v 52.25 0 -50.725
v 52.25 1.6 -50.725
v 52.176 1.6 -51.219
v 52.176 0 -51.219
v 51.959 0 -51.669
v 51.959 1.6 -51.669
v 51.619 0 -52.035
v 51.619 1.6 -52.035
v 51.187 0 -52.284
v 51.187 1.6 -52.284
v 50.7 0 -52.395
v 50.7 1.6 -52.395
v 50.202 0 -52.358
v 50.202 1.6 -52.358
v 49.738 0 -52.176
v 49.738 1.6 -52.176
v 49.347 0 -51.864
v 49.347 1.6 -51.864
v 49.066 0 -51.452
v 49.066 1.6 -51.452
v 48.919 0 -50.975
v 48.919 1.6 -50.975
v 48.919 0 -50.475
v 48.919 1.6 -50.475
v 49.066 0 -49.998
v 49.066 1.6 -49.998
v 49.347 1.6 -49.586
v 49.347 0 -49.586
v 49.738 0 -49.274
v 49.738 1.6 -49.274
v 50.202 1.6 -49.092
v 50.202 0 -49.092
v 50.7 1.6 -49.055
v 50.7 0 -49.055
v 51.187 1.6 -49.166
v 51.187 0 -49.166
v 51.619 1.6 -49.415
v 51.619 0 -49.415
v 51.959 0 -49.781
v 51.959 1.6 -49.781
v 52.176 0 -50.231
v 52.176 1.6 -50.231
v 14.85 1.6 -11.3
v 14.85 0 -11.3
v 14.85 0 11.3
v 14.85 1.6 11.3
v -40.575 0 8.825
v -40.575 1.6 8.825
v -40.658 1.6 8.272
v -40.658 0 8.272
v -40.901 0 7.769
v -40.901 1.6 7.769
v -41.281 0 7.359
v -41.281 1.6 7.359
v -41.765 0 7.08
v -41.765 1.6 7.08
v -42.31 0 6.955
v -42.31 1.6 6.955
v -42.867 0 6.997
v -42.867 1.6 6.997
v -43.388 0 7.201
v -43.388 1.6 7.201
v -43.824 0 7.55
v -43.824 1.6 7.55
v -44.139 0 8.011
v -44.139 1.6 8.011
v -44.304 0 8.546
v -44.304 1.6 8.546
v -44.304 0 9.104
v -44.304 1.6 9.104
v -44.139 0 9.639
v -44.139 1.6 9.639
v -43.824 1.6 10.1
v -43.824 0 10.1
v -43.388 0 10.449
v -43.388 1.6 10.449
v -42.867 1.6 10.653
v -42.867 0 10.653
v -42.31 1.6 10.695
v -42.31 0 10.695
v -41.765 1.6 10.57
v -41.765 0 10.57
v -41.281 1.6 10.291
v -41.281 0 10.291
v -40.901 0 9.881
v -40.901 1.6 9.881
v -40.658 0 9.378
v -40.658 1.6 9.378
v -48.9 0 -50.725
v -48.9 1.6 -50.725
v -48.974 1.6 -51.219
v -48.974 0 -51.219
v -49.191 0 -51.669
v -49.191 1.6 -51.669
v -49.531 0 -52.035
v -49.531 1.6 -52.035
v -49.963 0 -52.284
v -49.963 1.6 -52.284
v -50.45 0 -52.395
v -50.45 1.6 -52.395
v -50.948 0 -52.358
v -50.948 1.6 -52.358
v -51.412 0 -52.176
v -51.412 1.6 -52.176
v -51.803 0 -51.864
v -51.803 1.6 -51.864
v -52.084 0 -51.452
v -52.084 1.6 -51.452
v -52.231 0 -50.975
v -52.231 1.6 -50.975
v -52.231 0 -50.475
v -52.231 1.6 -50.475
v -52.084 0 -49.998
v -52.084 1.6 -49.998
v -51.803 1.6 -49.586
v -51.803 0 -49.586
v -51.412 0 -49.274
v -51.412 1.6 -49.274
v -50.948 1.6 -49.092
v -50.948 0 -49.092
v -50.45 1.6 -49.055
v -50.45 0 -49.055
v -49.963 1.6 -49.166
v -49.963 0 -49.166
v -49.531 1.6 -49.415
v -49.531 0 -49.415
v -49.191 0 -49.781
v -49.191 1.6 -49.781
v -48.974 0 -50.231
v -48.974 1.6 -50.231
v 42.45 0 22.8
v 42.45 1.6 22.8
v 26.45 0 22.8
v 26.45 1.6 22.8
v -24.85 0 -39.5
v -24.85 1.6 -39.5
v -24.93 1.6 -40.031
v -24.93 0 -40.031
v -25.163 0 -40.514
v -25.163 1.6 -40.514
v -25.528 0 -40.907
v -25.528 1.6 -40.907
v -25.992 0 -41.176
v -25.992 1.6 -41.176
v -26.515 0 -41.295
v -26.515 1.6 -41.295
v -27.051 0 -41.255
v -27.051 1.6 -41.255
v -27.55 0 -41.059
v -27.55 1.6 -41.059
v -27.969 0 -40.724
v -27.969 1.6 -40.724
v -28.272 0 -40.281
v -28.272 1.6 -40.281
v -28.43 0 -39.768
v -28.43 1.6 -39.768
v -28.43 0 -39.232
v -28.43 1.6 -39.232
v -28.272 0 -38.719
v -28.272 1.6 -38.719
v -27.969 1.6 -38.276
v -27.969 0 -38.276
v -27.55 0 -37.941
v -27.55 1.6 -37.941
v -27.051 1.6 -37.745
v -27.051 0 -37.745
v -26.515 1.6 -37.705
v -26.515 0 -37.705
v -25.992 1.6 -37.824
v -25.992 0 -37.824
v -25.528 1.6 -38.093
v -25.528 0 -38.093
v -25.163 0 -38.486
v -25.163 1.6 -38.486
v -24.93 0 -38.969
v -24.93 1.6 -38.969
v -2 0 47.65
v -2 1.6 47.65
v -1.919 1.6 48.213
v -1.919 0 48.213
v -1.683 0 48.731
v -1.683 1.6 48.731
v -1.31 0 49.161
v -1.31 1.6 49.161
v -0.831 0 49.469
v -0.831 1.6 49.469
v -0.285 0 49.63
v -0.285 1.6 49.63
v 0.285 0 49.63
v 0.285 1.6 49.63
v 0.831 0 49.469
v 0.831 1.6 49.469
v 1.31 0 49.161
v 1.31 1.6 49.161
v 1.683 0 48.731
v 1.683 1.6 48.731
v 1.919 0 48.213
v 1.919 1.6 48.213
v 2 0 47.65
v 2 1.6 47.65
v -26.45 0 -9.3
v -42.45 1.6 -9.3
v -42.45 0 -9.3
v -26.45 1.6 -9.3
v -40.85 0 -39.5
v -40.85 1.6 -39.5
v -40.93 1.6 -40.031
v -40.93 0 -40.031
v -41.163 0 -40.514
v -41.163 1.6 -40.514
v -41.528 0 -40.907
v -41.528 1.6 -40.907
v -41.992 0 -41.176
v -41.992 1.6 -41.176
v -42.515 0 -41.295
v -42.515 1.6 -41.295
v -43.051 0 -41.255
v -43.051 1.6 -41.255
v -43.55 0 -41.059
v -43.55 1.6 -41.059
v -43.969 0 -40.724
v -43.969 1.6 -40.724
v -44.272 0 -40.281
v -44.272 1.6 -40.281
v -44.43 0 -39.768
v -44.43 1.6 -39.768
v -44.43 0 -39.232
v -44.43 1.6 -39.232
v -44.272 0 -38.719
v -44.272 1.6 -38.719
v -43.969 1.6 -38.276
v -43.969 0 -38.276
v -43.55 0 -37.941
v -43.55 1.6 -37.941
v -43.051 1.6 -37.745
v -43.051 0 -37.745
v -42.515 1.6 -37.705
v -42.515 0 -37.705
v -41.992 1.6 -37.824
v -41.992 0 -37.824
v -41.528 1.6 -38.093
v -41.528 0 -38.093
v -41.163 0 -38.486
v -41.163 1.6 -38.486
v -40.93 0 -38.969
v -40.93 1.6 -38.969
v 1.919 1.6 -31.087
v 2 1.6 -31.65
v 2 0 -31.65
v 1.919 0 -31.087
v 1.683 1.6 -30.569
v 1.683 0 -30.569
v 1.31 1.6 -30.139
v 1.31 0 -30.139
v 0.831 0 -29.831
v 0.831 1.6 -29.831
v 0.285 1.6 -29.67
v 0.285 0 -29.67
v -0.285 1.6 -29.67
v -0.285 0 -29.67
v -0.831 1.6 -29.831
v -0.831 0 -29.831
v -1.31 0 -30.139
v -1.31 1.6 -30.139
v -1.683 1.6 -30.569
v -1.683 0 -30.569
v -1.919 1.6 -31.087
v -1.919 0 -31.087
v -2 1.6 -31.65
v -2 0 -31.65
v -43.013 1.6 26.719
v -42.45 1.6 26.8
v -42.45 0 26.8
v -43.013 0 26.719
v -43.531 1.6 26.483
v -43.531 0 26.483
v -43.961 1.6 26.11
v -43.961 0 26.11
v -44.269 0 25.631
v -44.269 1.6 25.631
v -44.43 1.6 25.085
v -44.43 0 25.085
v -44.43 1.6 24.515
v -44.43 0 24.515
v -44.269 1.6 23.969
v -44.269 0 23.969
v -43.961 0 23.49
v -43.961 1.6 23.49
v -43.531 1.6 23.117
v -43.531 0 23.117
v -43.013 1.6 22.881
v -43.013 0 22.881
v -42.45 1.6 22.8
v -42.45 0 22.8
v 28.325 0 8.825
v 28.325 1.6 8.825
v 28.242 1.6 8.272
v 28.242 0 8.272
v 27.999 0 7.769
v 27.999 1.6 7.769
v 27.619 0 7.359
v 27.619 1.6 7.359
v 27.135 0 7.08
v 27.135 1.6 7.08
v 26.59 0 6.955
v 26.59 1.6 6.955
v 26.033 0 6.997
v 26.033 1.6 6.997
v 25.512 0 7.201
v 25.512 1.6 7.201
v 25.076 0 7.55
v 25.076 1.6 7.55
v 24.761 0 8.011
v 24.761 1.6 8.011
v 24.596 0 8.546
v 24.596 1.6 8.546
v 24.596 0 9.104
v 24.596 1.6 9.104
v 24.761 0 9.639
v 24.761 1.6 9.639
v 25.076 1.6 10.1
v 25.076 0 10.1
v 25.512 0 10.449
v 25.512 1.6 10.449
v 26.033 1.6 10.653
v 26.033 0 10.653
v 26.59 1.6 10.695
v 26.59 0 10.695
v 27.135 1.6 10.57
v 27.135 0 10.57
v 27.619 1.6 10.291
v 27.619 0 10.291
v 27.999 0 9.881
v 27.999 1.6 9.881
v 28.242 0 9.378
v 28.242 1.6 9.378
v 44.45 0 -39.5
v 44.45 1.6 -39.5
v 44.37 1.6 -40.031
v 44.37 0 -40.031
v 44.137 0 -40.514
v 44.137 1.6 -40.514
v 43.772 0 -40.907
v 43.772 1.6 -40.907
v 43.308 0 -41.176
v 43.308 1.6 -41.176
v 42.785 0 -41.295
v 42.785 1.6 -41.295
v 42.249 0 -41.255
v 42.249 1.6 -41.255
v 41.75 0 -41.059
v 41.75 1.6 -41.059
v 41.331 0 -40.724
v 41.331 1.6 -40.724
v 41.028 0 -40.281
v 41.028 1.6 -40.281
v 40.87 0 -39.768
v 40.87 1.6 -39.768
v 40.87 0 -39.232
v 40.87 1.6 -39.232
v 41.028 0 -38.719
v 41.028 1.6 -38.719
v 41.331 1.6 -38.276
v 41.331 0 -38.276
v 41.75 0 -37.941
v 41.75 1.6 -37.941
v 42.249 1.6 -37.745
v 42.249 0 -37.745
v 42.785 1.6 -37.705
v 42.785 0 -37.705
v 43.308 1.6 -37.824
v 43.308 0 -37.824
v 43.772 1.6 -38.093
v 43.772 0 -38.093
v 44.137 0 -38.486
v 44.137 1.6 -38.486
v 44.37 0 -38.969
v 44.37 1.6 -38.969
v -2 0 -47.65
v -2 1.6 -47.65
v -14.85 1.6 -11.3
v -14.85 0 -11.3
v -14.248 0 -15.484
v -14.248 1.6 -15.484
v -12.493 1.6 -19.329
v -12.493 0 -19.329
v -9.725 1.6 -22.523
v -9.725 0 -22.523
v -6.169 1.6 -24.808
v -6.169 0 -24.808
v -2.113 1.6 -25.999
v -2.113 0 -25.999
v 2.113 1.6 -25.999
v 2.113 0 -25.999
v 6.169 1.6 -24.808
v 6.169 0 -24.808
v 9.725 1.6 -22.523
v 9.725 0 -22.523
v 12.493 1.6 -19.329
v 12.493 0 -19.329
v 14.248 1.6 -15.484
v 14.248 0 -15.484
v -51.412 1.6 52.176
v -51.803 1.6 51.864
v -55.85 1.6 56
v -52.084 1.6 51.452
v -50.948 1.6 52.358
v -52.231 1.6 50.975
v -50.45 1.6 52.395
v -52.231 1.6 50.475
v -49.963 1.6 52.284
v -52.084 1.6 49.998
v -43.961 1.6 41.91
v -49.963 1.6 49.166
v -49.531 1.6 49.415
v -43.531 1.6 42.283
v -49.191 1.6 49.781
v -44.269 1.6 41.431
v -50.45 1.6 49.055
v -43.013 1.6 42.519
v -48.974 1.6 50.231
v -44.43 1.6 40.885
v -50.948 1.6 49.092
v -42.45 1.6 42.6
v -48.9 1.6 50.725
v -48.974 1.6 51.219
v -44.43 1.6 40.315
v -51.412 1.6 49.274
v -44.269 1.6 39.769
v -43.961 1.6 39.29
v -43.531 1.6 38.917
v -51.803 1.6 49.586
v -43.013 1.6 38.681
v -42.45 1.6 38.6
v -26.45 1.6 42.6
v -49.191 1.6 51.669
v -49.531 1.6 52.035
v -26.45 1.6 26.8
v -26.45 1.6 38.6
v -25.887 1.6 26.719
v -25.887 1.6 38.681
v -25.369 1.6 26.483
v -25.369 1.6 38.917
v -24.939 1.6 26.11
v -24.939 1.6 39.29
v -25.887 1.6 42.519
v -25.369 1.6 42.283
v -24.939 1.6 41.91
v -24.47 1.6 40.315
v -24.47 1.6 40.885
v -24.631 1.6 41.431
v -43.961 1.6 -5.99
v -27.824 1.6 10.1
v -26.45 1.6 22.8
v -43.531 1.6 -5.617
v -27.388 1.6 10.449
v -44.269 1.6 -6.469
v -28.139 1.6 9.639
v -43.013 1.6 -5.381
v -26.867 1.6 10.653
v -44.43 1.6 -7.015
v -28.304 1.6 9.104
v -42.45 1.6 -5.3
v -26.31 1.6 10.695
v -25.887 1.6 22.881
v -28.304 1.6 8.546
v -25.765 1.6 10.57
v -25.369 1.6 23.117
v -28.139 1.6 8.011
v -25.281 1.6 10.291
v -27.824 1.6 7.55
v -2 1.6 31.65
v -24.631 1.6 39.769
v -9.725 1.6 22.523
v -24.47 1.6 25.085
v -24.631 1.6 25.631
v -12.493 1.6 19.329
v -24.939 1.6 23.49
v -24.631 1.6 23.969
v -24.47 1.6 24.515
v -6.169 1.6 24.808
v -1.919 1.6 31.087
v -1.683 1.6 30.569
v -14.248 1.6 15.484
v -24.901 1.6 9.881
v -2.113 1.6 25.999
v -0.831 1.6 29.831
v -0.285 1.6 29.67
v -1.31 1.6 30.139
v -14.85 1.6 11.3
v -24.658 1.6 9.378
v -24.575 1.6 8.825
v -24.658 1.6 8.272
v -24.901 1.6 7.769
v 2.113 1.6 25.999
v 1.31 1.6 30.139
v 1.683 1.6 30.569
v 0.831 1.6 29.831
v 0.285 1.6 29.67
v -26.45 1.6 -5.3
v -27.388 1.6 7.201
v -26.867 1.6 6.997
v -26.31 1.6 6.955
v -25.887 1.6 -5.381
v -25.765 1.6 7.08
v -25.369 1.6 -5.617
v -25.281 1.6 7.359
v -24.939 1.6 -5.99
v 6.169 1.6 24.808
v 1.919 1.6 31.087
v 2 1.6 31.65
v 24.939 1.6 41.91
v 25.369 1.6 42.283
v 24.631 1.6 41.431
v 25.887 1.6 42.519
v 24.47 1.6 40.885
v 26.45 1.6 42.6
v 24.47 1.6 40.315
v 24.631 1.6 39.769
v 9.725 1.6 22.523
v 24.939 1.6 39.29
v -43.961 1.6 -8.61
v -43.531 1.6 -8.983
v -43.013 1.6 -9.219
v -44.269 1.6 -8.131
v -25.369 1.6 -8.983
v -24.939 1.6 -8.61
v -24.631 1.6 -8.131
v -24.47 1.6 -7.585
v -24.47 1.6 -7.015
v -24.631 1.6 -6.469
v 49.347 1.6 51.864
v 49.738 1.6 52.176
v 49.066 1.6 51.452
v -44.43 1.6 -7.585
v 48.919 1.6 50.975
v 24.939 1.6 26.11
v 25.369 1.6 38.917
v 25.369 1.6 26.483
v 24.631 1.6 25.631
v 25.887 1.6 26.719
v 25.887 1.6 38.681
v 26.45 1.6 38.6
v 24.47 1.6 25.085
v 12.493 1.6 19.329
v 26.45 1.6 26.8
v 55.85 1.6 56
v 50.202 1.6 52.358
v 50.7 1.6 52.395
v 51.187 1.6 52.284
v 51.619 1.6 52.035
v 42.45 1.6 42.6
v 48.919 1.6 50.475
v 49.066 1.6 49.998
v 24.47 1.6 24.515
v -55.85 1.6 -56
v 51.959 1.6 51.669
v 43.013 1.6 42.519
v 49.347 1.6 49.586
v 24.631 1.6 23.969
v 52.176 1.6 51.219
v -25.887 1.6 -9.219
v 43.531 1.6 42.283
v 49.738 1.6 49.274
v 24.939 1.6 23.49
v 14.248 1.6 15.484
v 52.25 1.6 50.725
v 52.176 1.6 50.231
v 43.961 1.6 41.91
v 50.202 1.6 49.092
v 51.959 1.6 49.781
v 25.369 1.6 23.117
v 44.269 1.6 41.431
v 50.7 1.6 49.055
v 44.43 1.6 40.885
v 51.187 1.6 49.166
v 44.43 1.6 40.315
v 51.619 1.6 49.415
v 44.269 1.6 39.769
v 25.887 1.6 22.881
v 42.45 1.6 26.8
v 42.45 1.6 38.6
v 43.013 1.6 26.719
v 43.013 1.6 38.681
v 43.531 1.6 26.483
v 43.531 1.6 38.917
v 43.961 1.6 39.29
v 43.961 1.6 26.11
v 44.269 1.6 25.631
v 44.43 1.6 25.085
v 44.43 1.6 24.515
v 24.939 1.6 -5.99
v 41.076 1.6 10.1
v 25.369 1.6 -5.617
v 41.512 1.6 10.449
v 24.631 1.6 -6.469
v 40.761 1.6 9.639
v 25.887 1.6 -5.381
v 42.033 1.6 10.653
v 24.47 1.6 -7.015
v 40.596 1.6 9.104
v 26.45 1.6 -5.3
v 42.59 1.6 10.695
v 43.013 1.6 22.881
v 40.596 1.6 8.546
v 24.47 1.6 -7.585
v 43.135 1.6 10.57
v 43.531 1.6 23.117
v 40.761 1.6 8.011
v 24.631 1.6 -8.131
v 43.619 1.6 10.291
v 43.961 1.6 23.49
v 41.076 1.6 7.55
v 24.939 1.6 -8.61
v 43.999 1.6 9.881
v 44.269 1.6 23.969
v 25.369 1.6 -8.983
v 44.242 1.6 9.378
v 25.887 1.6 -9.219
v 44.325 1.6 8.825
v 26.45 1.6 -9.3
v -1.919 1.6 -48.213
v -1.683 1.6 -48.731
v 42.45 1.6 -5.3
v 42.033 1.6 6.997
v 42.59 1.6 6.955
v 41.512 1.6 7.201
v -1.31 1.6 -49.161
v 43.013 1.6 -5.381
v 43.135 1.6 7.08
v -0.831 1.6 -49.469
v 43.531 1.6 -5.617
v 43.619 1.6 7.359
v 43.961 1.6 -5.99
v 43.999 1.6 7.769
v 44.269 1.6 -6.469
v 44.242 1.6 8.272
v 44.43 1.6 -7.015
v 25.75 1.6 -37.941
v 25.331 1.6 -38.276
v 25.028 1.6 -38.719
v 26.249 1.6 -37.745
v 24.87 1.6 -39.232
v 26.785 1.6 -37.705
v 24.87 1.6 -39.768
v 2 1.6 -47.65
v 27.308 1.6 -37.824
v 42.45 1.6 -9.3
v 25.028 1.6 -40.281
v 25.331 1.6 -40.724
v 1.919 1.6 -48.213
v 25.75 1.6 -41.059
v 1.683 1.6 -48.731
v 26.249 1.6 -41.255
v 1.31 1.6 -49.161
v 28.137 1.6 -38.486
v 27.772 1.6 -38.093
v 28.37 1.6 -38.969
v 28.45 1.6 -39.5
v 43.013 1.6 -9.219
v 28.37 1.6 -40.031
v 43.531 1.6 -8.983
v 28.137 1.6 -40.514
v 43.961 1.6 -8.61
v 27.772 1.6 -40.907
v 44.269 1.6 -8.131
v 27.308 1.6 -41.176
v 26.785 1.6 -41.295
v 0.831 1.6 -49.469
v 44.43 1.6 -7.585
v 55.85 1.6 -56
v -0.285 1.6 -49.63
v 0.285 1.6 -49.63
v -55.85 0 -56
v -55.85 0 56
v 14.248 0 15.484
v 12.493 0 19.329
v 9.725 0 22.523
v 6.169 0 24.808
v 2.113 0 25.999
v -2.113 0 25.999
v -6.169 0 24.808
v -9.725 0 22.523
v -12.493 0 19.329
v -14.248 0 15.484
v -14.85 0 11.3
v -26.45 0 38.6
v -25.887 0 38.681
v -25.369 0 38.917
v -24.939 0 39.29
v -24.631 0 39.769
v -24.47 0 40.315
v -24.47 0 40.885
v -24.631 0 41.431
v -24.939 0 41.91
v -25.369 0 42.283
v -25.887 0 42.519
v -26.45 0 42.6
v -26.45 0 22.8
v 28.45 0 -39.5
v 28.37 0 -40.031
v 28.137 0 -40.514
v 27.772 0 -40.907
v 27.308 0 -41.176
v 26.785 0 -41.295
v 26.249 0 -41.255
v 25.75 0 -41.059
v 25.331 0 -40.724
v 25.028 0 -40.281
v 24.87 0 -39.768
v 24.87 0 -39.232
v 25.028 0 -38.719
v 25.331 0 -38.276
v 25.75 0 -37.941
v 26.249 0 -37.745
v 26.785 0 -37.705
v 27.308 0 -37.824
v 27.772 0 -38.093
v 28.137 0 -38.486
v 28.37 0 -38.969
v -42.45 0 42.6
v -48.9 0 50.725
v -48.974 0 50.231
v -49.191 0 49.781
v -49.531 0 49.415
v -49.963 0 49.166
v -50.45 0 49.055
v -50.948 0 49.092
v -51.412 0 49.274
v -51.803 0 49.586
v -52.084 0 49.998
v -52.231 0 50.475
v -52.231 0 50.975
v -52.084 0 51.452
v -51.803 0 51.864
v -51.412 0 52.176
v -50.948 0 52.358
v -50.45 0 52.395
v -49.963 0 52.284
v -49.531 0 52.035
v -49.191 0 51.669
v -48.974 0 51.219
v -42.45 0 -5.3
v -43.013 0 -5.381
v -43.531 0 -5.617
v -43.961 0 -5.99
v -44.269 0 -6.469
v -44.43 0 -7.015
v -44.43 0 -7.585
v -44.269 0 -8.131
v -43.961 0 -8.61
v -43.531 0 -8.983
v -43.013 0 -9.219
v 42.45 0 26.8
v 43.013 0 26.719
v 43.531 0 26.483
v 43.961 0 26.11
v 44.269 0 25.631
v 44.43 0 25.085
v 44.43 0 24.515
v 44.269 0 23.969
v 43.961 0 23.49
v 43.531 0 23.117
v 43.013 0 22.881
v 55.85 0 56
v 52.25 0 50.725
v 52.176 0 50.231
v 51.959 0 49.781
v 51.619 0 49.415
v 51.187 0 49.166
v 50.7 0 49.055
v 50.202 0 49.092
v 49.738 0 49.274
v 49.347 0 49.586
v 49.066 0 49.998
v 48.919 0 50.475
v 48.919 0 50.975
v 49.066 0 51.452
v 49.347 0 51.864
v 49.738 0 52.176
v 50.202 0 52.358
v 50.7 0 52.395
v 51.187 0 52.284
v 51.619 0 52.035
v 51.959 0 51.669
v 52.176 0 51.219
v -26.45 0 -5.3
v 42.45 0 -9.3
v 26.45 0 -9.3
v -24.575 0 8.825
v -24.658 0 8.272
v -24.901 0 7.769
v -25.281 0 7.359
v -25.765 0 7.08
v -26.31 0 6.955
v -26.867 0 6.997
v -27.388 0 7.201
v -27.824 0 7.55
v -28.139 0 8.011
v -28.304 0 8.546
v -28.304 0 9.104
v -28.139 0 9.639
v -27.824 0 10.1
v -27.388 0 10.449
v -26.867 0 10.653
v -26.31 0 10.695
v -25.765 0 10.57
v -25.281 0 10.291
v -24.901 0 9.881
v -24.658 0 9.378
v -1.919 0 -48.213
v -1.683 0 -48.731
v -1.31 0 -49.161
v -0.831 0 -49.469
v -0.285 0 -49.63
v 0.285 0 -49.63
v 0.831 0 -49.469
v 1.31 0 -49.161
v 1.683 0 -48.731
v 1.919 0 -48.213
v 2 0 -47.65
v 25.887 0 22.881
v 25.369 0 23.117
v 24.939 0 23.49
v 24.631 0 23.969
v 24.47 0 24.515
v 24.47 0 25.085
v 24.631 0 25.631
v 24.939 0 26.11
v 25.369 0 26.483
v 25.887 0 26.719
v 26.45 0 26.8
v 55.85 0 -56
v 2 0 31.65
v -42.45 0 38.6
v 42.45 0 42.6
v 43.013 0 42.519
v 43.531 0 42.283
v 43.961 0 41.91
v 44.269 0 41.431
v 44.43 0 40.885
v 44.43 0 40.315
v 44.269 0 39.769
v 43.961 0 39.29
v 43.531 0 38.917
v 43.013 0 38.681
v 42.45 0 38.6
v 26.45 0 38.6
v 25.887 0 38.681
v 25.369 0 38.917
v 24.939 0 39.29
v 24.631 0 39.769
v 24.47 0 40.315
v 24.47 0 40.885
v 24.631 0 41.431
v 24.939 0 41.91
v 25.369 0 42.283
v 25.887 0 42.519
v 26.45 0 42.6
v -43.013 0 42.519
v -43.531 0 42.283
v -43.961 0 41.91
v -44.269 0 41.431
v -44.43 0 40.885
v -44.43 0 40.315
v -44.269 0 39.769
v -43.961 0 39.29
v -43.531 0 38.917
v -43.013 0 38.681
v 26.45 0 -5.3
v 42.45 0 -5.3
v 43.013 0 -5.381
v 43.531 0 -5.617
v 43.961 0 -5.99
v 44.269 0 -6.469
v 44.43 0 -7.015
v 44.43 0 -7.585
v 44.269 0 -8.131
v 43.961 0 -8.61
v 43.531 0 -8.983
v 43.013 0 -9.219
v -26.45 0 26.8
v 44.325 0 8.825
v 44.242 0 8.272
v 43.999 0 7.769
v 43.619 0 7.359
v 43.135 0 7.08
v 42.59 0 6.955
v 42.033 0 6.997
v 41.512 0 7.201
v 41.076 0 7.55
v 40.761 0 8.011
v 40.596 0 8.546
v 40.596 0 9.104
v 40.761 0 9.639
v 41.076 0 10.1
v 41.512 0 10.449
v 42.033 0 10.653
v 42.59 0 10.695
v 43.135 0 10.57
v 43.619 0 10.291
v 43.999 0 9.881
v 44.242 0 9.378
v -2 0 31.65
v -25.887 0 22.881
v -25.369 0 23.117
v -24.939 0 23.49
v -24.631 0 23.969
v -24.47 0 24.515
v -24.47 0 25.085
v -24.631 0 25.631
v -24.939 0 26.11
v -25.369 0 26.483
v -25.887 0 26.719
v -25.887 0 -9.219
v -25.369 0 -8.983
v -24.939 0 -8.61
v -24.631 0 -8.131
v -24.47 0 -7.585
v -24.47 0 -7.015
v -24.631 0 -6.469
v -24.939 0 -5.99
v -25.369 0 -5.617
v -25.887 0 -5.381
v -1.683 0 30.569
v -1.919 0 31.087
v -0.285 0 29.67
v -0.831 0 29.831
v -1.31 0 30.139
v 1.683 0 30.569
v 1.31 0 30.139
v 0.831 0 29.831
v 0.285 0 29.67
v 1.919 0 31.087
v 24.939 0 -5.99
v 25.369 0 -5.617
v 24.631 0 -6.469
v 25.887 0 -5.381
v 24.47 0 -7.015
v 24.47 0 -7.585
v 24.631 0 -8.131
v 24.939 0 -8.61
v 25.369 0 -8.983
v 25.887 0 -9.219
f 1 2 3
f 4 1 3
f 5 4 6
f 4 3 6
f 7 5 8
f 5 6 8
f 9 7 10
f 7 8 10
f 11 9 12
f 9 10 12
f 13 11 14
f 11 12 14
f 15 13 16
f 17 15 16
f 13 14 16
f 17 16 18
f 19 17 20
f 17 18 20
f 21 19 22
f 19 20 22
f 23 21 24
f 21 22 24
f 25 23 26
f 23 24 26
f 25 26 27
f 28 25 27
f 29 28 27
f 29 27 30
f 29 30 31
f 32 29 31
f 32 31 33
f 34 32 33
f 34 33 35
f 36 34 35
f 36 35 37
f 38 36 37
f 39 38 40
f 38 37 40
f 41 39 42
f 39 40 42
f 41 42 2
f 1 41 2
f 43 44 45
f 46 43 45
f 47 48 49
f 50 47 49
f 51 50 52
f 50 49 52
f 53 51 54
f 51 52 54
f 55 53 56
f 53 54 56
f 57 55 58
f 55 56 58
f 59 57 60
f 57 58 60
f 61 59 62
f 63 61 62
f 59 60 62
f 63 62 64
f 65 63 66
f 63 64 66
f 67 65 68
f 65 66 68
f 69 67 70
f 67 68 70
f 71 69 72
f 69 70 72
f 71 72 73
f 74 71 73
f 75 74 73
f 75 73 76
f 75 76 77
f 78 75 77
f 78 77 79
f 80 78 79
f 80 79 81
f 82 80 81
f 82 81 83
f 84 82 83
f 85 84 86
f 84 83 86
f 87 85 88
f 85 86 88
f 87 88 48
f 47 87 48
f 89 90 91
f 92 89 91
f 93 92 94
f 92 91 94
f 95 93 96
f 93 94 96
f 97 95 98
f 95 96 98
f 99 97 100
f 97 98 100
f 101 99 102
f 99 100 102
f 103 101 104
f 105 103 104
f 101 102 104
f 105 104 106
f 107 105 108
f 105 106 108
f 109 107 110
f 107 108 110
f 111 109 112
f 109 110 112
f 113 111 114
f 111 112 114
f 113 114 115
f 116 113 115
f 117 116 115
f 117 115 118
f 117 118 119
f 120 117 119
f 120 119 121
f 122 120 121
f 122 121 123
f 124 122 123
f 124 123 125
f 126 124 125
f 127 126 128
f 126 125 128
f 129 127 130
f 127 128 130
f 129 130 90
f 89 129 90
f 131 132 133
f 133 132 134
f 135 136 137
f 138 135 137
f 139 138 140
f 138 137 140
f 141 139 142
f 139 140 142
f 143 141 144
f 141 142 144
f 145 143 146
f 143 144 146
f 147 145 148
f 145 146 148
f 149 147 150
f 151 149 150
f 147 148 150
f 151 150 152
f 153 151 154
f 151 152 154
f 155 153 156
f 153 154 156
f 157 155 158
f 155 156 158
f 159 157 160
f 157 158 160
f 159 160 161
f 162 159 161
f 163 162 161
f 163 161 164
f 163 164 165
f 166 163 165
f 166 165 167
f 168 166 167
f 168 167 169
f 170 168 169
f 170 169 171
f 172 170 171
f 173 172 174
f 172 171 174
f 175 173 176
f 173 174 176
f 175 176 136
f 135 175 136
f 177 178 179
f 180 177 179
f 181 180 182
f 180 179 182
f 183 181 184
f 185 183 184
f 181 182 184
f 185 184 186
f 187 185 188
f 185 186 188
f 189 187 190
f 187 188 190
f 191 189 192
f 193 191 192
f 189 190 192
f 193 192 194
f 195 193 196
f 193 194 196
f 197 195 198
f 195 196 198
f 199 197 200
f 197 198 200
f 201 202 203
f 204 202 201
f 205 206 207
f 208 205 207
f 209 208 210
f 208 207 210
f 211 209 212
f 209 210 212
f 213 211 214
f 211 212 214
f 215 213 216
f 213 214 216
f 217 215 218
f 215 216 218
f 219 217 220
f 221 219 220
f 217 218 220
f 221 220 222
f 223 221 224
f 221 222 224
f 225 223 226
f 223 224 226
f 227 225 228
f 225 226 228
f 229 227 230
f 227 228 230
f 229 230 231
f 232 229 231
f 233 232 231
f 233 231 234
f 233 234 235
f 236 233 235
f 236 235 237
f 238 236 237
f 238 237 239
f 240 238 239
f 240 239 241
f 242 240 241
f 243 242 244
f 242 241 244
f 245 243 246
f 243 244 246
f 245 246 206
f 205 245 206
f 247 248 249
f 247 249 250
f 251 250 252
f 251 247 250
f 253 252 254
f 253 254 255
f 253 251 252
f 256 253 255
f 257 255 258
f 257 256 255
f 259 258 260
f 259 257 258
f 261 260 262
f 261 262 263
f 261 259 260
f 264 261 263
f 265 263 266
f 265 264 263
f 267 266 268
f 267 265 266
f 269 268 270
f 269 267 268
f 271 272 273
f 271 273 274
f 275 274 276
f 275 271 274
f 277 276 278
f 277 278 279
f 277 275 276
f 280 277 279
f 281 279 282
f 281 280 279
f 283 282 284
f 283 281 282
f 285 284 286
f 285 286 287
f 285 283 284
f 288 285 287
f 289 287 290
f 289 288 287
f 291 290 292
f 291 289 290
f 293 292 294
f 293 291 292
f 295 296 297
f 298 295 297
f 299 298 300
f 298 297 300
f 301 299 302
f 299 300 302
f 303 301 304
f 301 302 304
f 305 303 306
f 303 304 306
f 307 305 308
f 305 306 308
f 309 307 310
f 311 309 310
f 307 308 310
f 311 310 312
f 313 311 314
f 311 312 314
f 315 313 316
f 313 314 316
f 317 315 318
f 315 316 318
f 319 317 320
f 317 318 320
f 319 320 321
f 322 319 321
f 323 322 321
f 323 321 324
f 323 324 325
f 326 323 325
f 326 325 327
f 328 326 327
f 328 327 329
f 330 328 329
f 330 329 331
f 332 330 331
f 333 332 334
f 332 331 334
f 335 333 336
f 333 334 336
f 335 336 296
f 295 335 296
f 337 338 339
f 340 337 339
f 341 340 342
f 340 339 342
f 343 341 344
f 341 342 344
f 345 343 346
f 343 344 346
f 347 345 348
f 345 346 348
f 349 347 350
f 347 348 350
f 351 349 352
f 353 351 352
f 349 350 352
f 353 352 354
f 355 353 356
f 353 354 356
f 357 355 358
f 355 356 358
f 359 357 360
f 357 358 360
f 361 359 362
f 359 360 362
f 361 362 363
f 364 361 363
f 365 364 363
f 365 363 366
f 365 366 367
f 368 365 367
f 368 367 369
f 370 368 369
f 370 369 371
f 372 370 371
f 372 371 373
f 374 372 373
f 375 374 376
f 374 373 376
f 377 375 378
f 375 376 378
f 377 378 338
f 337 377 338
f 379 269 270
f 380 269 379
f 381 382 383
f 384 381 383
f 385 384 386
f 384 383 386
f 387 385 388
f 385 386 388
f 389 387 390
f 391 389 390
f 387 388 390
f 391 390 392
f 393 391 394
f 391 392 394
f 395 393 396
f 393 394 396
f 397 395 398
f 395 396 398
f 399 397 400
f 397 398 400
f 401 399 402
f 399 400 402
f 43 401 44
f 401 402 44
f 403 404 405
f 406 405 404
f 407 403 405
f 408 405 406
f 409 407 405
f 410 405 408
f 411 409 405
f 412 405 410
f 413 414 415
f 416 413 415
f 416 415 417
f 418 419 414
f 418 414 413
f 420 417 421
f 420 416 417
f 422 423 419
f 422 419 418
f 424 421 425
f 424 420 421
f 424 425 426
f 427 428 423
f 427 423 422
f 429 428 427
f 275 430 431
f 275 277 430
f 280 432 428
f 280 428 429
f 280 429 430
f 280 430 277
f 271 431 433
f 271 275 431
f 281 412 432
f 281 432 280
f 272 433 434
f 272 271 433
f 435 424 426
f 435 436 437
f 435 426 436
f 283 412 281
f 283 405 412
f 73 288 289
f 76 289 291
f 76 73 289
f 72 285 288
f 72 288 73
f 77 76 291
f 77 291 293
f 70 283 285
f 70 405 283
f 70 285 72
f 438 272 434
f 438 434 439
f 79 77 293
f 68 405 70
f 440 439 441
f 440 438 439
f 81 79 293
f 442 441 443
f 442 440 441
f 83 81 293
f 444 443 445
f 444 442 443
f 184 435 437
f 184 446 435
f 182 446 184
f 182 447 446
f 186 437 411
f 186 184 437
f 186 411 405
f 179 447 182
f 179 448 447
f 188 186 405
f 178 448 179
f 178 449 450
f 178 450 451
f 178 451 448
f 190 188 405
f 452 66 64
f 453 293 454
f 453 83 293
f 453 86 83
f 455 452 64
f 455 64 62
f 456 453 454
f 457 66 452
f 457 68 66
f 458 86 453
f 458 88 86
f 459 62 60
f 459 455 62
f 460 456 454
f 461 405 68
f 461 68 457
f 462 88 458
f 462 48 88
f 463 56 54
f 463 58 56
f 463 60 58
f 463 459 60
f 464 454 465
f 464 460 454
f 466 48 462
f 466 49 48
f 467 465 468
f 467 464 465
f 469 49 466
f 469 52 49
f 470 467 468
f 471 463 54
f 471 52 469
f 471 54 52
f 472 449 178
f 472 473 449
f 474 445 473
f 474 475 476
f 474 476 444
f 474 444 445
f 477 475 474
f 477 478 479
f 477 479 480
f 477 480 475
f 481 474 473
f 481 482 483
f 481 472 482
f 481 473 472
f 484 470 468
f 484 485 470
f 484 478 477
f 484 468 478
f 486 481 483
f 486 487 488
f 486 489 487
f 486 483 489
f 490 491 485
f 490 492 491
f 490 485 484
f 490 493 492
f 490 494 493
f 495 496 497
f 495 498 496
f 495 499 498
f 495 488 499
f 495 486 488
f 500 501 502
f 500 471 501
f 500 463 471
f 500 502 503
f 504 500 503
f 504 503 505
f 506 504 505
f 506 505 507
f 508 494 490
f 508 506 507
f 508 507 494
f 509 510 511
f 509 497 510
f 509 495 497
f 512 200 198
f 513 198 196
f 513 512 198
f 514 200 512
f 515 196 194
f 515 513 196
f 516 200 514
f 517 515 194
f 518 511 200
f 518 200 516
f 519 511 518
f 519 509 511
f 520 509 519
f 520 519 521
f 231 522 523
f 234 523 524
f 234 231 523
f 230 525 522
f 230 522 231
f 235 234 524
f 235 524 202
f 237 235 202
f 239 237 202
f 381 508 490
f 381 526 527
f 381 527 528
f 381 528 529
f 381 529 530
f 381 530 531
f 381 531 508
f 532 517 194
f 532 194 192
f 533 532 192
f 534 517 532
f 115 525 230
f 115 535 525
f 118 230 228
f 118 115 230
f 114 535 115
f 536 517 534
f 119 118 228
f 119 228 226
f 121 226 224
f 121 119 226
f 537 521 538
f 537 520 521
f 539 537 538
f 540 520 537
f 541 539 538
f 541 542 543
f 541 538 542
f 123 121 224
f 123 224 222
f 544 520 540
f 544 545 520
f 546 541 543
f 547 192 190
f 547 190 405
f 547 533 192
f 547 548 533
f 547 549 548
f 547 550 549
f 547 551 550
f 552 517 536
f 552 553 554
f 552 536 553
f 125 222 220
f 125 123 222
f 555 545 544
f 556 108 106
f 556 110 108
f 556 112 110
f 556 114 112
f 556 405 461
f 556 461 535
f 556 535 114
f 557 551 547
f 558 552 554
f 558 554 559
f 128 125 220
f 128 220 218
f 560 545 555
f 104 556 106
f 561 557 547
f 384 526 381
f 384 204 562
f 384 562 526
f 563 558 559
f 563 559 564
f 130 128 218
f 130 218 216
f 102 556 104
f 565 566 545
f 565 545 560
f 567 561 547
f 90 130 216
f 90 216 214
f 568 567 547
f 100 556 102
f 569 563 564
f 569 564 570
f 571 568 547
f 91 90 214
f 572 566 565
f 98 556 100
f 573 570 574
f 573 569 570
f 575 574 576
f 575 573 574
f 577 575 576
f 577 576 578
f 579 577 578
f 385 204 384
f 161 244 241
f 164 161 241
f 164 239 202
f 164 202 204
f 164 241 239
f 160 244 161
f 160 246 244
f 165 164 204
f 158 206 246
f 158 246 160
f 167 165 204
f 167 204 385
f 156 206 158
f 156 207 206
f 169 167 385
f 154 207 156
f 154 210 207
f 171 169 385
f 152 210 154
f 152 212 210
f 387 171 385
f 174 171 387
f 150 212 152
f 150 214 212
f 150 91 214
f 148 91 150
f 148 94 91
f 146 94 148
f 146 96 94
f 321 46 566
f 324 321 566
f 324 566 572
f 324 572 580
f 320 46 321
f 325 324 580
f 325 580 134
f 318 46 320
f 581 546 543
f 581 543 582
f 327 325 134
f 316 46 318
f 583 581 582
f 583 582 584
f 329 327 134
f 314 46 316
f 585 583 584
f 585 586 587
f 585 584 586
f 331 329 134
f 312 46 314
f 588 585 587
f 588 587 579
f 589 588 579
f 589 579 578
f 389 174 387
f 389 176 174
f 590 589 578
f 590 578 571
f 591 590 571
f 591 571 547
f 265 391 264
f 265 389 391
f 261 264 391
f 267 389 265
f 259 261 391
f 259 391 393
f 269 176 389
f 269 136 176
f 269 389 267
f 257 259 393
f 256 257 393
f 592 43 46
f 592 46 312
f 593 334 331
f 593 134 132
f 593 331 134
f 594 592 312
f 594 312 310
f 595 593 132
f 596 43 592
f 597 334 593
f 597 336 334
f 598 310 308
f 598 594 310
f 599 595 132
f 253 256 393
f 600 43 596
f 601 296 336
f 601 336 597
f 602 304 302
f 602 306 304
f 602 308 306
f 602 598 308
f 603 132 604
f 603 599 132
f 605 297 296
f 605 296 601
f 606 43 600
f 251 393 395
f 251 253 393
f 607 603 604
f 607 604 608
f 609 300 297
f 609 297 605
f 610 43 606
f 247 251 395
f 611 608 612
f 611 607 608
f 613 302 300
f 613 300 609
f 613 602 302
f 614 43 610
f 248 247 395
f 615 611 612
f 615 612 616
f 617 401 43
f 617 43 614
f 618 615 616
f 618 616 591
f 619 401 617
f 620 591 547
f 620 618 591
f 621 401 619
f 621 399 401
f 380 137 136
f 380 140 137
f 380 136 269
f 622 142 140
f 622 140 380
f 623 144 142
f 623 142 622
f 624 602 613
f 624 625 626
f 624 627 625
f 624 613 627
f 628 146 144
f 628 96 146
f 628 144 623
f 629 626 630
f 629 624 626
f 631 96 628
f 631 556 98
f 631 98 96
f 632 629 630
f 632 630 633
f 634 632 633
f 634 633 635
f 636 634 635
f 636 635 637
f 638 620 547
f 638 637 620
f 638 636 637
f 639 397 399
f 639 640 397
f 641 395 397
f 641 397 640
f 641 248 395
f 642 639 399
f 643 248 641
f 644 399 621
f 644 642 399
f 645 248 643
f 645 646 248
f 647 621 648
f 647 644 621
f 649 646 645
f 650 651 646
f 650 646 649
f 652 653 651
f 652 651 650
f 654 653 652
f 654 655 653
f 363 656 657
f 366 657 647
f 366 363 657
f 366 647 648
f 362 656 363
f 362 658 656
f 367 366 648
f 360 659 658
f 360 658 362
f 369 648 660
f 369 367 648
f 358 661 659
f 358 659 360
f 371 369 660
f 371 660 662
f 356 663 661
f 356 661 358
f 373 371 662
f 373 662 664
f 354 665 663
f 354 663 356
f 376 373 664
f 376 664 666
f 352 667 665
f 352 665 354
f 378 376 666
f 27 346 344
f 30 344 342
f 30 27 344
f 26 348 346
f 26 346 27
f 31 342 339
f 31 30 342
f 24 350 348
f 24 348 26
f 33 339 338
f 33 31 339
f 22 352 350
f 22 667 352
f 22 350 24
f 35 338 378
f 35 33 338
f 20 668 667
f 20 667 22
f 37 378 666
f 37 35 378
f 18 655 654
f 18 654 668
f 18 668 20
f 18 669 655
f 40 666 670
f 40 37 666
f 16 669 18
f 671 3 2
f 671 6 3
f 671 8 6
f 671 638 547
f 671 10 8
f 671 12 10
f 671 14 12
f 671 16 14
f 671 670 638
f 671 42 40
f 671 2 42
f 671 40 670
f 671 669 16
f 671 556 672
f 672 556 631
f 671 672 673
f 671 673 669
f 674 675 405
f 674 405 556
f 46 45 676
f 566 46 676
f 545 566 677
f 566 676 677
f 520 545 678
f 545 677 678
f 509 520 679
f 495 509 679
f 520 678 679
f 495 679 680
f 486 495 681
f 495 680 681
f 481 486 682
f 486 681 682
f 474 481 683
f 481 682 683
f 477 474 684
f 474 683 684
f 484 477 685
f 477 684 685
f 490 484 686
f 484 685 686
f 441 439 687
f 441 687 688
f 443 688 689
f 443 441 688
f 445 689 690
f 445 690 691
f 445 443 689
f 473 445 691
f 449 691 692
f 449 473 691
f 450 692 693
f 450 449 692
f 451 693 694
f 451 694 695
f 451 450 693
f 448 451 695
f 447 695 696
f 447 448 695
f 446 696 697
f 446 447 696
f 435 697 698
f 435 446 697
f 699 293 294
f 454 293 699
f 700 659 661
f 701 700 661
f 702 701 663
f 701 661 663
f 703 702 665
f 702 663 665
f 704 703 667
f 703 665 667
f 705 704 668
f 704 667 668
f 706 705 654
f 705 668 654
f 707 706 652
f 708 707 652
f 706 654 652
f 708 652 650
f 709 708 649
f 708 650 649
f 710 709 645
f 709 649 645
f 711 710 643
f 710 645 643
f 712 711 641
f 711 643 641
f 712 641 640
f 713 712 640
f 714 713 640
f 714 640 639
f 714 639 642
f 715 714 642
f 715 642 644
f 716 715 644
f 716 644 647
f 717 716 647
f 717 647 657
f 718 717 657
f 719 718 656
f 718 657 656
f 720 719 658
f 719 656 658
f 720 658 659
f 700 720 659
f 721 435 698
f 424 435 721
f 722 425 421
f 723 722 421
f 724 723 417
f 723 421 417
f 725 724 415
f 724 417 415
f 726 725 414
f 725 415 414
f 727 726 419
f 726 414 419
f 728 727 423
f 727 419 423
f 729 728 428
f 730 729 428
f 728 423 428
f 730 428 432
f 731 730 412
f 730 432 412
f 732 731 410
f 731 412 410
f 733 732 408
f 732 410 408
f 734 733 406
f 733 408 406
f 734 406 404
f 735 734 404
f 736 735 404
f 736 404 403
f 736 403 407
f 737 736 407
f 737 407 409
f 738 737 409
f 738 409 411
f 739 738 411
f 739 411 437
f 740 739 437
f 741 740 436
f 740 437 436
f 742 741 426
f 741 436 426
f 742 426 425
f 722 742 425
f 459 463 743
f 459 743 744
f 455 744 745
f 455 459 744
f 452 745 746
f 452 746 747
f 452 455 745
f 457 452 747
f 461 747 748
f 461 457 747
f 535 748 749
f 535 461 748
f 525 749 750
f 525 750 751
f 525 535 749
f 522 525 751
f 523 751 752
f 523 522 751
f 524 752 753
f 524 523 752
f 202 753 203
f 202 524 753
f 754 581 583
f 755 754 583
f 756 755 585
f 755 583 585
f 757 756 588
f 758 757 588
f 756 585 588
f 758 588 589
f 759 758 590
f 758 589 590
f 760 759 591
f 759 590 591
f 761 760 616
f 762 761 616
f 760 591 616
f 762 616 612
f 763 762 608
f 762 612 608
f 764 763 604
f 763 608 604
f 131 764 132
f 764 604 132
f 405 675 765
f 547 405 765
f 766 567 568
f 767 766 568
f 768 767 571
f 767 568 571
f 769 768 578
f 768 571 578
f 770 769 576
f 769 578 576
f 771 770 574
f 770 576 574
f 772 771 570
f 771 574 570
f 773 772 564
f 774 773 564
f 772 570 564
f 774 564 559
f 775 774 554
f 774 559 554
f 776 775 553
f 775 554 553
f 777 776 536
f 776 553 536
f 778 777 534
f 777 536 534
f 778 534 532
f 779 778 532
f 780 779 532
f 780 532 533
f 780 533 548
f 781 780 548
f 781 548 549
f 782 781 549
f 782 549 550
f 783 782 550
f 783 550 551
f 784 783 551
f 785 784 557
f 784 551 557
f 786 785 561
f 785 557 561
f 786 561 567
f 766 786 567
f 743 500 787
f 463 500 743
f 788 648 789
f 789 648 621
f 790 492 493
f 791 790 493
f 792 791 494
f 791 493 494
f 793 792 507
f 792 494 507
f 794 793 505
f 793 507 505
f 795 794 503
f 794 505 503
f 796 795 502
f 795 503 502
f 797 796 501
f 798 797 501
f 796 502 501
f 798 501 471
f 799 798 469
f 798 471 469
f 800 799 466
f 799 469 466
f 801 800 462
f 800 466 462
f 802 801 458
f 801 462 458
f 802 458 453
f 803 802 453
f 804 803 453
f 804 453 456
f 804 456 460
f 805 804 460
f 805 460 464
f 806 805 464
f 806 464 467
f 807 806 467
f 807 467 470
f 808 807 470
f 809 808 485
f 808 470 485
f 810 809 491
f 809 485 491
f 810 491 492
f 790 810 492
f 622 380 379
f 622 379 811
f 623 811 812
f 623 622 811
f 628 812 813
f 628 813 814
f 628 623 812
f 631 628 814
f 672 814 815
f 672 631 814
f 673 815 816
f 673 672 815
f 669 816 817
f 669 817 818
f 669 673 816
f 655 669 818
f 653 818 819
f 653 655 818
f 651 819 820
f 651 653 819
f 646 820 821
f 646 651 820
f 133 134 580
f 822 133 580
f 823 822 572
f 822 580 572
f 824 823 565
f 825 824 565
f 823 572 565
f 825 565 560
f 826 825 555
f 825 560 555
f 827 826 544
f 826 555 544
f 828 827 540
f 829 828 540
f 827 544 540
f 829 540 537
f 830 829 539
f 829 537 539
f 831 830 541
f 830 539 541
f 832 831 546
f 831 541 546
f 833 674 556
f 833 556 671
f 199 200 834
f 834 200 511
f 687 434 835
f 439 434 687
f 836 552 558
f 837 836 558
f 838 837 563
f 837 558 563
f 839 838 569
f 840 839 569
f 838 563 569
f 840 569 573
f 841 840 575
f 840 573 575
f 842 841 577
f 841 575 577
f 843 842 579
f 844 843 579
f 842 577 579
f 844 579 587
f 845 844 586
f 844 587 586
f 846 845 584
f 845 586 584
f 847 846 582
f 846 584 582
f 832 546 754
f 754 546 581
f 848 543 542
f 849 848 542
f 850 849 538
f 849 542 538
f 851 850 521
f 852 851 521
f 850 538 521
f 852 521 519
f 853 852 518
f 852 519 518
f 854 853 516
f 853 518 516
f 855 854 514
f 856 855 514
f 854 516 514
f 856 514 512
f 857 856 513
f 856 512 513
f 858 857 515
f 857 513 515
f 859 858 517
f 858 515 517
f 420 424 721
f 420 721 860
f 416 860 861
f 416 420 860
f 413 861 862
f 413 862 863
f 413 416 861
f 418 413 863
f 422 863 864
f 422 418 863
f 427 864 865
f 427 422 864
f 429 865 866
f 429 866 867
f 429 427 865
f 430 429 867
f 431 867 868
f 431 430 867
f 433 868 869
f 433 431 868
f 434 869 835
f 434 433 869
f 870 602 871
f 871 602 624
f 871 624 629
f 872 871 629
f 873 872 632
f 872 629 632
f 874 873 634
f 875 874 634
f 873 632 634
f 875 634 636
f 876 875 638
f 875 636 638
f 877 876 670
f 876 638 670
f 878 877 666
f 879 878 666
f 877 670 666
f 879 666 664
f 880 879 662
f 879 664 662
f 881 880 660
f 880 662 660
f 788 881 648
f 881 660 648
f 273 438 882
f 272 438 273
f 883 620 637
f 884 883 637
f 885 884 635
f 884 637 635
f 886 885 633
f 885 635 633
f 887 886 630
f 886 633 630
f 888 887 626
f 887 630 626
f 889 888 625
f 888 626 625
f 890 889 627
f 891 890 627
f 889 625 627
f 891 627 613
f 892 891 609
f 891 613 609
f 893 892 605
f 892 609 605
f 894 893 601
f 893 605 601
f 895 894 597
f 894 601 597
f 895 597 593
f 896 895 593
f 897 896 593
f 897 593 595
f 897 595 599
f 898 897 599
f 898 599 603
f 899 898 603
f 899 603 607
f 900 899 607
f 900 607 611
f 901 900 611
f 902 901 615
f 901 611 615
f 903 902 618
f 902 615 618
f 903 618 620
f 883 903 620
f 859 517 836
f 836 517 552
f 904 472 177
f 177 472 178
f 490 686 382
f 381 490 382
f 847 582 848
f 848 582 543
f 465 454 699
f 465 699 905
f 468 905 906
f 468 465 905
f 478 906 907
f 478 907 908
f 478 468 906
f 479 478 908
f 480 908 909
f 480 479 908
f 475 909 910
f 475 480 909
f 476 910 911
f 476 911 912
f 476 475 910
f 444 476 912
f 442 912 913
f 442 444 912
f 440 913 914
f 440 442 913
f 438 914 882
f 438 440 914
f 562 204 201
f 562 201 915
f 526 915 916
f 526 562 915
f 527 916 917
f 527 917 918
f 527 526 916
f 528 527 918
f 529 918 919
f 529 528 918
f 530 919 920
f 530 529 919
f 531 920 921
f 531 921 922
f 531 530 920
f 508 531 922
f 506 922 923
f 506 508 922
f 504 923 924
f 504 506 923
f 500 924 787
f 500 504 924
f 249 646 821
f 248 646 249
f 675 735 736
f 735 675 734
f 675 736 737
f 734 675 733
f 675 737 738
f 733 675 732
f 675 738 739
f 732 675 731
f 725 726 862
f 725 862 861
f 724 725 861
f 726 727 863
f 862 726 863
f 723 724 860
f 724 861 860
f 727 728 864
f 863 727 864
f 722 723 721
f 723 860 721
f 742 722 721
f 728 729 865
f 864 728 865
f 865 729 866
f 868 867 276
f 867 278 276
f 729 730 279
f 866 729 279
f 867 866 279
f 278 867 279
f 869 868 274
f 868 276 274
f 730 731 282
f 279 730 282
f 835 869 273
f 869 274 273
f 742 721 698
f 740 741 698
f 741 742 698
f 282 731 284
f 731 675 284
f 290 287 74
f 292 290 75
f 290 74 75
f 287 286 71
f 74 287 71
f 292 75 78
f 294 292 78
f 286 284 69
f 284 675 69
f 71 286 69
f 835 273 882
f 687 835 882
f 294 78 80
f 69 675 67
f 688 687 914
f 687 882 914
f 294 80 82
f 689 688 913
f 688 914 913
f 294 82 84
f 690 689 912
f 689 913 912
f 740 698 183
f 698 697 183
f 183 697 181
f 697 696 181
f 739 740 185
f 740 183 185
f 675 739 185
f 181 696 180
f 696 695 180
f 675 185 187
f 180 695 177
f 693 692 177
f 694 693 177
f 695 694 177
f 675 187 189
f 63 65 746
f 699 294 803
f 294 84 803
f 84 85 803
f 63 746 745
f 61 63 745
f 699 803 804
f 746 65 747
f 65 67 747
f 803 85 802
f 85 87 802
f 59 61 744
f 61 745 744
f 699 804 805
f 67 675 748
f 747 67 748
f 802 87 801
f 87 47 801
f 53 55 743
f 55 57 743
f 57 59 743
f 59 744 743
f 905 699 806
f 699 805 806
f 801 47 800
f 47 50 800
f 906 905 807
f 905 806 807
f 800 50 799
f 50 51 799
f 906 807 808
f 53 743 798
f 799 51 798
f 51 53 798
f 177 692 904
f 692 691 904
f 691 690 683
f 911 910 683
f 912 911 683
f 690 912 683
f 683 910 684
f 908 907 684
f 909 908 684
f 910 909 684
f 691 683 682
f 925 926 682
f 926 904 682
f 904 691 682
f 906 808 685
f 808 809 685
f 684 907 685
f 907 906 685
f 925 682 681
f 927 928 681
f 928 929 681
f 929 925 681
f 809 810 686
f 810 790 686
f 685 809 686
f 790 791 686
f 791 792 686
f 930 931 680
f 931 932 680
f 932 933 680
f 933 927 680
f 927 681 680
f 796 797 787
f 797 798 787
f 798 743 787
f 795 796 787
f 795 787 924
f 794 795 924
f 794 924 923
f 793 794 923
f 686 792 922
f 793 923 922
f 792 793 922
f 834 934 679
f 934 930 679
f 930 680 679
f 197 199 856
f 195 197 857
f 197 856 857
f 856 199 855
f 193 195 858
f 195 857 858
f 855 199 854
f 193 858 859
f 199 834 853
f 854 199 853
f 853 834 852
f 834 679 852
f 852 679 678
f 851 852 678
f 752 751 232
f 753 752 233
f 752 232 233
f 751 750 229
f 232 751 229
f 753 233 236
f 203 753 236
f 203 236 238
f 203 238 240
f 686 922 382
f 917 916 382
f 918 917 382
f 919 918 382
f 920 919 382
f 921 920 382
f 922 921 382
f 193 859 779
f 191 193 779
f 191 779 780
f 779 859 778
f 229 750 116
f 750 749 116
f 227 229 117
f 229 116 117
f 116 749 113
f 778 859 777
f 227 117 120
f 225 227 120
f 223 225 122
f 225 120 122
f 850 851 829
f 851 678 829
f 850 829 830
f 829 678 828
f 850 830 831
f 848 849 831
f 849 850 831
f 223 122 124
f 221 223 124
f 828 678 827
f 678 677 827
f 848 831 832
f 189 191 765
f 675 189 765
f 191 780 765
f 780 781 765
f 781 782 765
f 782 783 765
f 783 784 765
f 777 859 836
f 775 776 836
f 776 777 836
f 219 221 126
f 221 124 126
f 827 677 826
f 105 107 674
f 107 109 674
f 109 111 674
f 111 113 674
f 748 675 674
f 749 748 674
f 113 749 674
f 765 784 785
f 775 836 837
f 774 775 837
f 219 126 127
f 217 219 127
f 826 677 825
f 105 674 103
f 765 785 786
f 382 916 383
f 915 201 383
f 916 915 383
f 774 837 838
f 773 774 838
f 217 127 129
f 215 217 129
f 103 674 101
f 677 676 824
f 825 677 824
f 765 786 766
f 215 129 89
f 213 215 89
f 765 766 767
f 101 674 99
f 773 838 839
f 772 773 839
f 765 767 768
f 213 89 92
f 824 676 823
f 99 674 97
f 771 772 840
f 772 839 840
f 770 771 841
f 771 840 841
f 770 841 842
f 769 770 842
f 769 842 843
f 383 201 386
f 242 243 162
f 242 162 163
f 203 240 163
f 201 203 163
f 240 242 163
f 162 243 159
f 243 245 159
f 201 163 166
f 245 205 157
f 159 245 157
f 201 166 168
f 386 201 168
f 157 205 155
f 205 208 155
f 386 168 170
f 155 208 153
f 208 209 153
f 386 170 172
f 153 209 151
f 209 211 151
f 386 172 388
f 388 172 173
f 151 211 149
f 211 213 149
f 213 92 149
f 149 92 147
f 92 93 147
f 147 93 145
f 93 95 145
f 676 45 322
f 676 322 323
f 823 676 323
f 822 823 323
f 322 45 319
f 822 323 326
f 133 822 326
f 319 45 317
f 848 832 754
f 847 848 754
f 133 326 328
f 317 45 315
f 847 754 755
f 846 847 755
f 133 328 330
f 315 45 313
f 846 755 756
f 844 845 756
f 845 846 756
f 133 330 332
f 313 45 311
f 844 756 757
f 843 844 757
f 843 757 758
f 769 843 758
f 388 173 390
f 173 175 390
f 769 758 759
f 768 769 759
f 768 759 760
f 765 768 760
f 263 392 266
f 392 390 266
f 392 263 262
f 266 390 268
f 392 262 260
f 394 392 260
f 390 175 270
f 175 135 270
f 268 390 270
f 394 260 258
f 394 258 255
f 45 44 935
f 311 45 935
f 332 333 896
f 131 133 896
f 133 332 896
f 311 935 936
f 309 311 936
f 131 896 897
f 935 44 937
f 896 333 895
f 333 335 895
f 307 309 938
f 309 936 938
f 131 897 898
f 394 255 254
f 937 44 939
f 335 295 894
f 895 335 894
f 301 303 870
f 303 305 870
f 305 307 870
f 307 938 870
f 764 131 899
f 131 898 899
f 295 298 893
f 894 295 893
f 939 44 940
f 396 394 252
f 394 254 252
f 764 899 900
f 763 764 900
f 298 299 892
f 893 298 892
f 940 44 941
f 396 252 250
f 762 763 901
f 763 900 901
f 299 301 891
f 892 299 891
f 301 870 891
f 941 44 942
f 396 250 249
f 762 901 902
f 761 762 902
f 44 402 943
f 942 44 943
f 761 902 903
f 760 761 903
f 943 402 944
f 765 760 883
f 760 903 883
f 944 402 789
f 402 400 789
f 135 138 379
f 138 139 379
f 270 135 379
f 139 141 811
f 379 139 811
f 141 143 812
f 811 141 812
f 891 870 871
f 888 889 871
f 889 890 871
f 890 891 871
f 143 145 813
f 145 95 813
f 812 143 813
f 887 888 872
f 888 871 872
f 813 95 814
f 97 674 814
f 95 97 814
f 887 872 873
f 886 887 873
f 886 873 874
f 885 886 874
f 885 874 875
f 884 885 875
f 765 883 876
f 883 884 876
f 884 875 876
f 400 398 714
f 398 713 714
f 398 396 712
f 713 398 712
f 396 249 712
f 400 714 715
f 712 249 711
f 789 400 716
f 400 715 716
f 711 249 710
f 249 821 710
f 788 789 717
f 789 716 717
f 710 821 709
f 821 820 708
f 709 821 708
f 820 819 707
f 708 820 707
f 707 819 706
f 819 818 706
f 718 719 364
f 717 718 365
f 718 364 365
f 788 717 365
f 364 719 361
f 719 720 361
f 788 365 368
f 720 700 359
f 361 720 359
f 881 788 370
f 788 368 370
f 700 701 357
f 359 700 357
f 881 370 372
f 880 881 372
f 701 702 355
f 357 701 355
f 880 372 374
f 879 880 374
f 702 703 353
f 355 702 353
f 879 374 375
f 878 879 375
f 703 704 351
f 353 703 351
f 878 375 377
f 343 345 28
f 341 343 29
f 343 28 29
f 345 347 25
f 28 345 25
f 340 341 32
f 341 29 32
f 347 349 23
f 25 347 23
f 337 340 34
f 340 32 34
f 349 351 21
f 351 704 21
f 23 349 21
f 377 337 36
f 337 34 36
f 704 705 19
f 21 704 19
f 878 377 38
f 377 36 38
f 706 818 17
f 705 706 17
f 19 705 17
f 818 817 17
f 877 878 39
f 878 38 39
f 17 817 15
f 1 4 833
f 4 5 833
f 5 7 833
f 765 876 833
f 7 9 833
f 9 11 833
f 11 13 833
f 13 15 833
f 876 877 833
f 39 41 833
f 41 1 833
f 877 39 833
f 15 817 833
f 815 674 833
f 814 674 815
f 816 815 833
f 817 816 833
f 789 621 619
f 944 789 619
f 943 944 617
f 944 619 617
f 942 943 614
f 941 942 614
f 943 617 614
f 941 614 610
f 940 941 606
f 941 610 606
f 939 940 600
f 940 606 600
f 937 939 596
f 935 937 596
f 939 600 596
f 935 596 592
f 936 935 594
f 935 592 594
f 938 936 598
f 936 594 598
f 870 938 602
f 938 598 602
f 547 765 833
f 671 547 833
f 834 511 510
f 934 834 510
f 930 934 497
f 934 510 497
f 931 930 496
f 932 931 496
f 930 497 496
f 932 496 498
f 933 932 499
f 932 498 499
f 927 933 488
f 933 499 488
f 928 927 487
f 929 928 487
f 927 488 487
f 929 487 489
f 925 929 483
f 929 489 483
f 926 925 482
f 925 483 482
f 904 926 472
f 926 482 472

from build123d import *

# Parameters (mm, degrees)
SKETCH1_W           = 111.7
SKETCH1_H           = 112
BOSS_EXTRUDE1_DEPTH = 1.6
CUT_EXTRUDE1_DEPTH  = 1.6
SKETCH3_R           = 1.675
SKETCH3_R_2         = 1.8
SKETCH3_R_3         = 1.875
CUT_EXTRUDE2_DEPTH  = 1.6


with BuildPart() as part:
    # Sketch1 → Boss-Extrude1 (new body)
    with BuildSketch(Plane(origin=(0, 0, 0), x_dir=(1, 0, 0), z_dir=(0, 1, 0))):
        Rectangle(SKETCH1_W, SKETCH1_H)
        with BuildLine():
            Line((-14.85, -11.3), (-14.85, 11.3))
            ThreePointArc((-14.85, 11.3), (0, 26.15), (14.85, 11.3))
            Line((14.85, 11.3), (14.85, -11.3))
            ThreePointArc((14.85, -11.3), (0, -26.15), (-14.85, -11.3))
        make_face(mode=Mode.SUBTRACT)
    extrude(amount=BOSS_EXTRUDE1_DEPTH)

    # Sketch2 → Cut-Extrude1 (cut)
    with BuildSketch(Plane(origin=(0, 1.6, 0), x_dir=(1, 0, 0), z_dir=(0, 1, 0))):
        with BuildLine():
            Line((2, 47.65), (2, 31.65))
            ThreePointArc((2, 31.65), (0, 29.65), (-2, 31.65))
            Line((-2, 31.65), (-2, 47.65))
            ThreePointArc((-2, 47.65), (0, 49.65), (2, 47.65))
        make_face()
        with BuildLine():
            Line((2, -47.65), (2, -31.65))
            ThreePointArc((2, -31.65), (0, -29.65), (-2, -31.65))
            Line((-2, -31.65), (-2, -47.65))
            ThreePointArc((-2, -47.65), (0, -49.65), (2, -47.65))
        make_face()
    extrude(amount=-CUT_EXTRUDE1_DEPTH, mode=Mode.SUBTRACT)

    # Sketch3 → Cut-Extrude2 (cut)
    with BuildSketch(Plane(origin=(0, 1.6, 0), x_dir=(1, 0, 0), z_dir=(0, 1, 0))):
        with Locations((-50.575, 50.725)):
            Circle(SKETCH3_R)
        with Locations((50.575, 50.725)):
            Circle(SKETCH3_R)
        with Locations((50.575, -50.725)):
            Circle(SKETCH3_R)
        with Locations((-50.575, -50.725)):
            Circle(SKETCH3_R)
        with Locations((-42.65, 39.5)):
            Circle(SKETCH3_R_2)
        with Locations((-26.65, 39.5)):
            Circle(SKETCH3_R_2)
        with Locations((-42.45, -8.825)):
            Circle(SKETCH3_R_3)
        with Locations((-26.45, -8.825)):
            Circle(SKETCH3_R_3)
        with Locations((26.45, -8.825)):
            Circle(SKETCH3_R_3)
        with Locations((42.45, -8.825)):
            Circle(SKETCH3_R_3)
        with Locations((42.65, 39.5)):
            Circle(SKETCH3_R_2)
        with Locations((26.65, 39.5)):
            Circle(SKETCH3_R_2)
        with BuildLine():
            Line((-42.45, 9.3), (-26.45, 9.3))
            ThreePointArc((-26.45, 9.3), (-24.45, 7.3), (-26.45, 5.3))
            Line((-26.45, 5.3), (-42.45, 5.3))
            ThreePointArc((-42.45, 5.3), (-44.45, 7.3), (-42.45, 9.3))
        make_face()
        with BuildLine():
            Line((-42.45, -38.6), (-26.45, -38.6))
            ThreePointArc((-26.45, -38.6), (-24.45, -40.6), (-26.45, -42.6))
            Line((-26.45, -42.6), (-42.45, -42.6))
            ThreePointArc((-42.45, -42.6), (-44.45, -40.6), (-42.45, -38.6))
        make_face()
        with BuildLine():
            Line((-42.45, -22.8), (-26.45, -22.8))
            ThreePointArc((-26.45, -22.8), (-24.45, -24.8), (-26.45, -26.8))
            Line((-26.45, -26.8), (-42.45, -26.8))
            ThreePointArc((-42.45, -26.8), (-44.45, -24.8), (-42.45, -22.8))
        make_face()
        with BuildLine():
            Line((42.45, -38.6), (26.45, -38.6))
            ThreePointArc((26.45, -38.6), (24.45, -40.6), (26.45, -42.6))
            Line((26.45, -42.6), (42.45, -42.6))
            ThreePointArc((42.45, -42.6), (44.45, -40.6), (42.45, -38.6))
        make_face()
        with BuildLine():
            Line((42.45, -22.8), (26.45, -22.8))
            ThreePointArc((26.45, -22.8), (24.45, -24.8), (26.45, -26.8))
            Line((26.45, -26.8), (42.45, -26.8))
            ThreePointArc((42.45, -26.8), (44.45, -24.8), (42.45, -22.8))
        make_face()
        with BuildLine():
            Line((42.45, 9.3), (26.45, 9.3))
            ThreePointArc((26.45, 9.3), (24.45, 7.3), (26.45, 5.3))
            Line((26.45, 5.3), (42.45, 5.3))
            ThreePointArc((42.45, 5.3), (44.45, 7.3), (42.45, 9.3))
        make_face()
    extrude(amount=-CUT_EXTRUDE2_DEPTH, mode=Mode.SUBTRACT)


solid = part.part
